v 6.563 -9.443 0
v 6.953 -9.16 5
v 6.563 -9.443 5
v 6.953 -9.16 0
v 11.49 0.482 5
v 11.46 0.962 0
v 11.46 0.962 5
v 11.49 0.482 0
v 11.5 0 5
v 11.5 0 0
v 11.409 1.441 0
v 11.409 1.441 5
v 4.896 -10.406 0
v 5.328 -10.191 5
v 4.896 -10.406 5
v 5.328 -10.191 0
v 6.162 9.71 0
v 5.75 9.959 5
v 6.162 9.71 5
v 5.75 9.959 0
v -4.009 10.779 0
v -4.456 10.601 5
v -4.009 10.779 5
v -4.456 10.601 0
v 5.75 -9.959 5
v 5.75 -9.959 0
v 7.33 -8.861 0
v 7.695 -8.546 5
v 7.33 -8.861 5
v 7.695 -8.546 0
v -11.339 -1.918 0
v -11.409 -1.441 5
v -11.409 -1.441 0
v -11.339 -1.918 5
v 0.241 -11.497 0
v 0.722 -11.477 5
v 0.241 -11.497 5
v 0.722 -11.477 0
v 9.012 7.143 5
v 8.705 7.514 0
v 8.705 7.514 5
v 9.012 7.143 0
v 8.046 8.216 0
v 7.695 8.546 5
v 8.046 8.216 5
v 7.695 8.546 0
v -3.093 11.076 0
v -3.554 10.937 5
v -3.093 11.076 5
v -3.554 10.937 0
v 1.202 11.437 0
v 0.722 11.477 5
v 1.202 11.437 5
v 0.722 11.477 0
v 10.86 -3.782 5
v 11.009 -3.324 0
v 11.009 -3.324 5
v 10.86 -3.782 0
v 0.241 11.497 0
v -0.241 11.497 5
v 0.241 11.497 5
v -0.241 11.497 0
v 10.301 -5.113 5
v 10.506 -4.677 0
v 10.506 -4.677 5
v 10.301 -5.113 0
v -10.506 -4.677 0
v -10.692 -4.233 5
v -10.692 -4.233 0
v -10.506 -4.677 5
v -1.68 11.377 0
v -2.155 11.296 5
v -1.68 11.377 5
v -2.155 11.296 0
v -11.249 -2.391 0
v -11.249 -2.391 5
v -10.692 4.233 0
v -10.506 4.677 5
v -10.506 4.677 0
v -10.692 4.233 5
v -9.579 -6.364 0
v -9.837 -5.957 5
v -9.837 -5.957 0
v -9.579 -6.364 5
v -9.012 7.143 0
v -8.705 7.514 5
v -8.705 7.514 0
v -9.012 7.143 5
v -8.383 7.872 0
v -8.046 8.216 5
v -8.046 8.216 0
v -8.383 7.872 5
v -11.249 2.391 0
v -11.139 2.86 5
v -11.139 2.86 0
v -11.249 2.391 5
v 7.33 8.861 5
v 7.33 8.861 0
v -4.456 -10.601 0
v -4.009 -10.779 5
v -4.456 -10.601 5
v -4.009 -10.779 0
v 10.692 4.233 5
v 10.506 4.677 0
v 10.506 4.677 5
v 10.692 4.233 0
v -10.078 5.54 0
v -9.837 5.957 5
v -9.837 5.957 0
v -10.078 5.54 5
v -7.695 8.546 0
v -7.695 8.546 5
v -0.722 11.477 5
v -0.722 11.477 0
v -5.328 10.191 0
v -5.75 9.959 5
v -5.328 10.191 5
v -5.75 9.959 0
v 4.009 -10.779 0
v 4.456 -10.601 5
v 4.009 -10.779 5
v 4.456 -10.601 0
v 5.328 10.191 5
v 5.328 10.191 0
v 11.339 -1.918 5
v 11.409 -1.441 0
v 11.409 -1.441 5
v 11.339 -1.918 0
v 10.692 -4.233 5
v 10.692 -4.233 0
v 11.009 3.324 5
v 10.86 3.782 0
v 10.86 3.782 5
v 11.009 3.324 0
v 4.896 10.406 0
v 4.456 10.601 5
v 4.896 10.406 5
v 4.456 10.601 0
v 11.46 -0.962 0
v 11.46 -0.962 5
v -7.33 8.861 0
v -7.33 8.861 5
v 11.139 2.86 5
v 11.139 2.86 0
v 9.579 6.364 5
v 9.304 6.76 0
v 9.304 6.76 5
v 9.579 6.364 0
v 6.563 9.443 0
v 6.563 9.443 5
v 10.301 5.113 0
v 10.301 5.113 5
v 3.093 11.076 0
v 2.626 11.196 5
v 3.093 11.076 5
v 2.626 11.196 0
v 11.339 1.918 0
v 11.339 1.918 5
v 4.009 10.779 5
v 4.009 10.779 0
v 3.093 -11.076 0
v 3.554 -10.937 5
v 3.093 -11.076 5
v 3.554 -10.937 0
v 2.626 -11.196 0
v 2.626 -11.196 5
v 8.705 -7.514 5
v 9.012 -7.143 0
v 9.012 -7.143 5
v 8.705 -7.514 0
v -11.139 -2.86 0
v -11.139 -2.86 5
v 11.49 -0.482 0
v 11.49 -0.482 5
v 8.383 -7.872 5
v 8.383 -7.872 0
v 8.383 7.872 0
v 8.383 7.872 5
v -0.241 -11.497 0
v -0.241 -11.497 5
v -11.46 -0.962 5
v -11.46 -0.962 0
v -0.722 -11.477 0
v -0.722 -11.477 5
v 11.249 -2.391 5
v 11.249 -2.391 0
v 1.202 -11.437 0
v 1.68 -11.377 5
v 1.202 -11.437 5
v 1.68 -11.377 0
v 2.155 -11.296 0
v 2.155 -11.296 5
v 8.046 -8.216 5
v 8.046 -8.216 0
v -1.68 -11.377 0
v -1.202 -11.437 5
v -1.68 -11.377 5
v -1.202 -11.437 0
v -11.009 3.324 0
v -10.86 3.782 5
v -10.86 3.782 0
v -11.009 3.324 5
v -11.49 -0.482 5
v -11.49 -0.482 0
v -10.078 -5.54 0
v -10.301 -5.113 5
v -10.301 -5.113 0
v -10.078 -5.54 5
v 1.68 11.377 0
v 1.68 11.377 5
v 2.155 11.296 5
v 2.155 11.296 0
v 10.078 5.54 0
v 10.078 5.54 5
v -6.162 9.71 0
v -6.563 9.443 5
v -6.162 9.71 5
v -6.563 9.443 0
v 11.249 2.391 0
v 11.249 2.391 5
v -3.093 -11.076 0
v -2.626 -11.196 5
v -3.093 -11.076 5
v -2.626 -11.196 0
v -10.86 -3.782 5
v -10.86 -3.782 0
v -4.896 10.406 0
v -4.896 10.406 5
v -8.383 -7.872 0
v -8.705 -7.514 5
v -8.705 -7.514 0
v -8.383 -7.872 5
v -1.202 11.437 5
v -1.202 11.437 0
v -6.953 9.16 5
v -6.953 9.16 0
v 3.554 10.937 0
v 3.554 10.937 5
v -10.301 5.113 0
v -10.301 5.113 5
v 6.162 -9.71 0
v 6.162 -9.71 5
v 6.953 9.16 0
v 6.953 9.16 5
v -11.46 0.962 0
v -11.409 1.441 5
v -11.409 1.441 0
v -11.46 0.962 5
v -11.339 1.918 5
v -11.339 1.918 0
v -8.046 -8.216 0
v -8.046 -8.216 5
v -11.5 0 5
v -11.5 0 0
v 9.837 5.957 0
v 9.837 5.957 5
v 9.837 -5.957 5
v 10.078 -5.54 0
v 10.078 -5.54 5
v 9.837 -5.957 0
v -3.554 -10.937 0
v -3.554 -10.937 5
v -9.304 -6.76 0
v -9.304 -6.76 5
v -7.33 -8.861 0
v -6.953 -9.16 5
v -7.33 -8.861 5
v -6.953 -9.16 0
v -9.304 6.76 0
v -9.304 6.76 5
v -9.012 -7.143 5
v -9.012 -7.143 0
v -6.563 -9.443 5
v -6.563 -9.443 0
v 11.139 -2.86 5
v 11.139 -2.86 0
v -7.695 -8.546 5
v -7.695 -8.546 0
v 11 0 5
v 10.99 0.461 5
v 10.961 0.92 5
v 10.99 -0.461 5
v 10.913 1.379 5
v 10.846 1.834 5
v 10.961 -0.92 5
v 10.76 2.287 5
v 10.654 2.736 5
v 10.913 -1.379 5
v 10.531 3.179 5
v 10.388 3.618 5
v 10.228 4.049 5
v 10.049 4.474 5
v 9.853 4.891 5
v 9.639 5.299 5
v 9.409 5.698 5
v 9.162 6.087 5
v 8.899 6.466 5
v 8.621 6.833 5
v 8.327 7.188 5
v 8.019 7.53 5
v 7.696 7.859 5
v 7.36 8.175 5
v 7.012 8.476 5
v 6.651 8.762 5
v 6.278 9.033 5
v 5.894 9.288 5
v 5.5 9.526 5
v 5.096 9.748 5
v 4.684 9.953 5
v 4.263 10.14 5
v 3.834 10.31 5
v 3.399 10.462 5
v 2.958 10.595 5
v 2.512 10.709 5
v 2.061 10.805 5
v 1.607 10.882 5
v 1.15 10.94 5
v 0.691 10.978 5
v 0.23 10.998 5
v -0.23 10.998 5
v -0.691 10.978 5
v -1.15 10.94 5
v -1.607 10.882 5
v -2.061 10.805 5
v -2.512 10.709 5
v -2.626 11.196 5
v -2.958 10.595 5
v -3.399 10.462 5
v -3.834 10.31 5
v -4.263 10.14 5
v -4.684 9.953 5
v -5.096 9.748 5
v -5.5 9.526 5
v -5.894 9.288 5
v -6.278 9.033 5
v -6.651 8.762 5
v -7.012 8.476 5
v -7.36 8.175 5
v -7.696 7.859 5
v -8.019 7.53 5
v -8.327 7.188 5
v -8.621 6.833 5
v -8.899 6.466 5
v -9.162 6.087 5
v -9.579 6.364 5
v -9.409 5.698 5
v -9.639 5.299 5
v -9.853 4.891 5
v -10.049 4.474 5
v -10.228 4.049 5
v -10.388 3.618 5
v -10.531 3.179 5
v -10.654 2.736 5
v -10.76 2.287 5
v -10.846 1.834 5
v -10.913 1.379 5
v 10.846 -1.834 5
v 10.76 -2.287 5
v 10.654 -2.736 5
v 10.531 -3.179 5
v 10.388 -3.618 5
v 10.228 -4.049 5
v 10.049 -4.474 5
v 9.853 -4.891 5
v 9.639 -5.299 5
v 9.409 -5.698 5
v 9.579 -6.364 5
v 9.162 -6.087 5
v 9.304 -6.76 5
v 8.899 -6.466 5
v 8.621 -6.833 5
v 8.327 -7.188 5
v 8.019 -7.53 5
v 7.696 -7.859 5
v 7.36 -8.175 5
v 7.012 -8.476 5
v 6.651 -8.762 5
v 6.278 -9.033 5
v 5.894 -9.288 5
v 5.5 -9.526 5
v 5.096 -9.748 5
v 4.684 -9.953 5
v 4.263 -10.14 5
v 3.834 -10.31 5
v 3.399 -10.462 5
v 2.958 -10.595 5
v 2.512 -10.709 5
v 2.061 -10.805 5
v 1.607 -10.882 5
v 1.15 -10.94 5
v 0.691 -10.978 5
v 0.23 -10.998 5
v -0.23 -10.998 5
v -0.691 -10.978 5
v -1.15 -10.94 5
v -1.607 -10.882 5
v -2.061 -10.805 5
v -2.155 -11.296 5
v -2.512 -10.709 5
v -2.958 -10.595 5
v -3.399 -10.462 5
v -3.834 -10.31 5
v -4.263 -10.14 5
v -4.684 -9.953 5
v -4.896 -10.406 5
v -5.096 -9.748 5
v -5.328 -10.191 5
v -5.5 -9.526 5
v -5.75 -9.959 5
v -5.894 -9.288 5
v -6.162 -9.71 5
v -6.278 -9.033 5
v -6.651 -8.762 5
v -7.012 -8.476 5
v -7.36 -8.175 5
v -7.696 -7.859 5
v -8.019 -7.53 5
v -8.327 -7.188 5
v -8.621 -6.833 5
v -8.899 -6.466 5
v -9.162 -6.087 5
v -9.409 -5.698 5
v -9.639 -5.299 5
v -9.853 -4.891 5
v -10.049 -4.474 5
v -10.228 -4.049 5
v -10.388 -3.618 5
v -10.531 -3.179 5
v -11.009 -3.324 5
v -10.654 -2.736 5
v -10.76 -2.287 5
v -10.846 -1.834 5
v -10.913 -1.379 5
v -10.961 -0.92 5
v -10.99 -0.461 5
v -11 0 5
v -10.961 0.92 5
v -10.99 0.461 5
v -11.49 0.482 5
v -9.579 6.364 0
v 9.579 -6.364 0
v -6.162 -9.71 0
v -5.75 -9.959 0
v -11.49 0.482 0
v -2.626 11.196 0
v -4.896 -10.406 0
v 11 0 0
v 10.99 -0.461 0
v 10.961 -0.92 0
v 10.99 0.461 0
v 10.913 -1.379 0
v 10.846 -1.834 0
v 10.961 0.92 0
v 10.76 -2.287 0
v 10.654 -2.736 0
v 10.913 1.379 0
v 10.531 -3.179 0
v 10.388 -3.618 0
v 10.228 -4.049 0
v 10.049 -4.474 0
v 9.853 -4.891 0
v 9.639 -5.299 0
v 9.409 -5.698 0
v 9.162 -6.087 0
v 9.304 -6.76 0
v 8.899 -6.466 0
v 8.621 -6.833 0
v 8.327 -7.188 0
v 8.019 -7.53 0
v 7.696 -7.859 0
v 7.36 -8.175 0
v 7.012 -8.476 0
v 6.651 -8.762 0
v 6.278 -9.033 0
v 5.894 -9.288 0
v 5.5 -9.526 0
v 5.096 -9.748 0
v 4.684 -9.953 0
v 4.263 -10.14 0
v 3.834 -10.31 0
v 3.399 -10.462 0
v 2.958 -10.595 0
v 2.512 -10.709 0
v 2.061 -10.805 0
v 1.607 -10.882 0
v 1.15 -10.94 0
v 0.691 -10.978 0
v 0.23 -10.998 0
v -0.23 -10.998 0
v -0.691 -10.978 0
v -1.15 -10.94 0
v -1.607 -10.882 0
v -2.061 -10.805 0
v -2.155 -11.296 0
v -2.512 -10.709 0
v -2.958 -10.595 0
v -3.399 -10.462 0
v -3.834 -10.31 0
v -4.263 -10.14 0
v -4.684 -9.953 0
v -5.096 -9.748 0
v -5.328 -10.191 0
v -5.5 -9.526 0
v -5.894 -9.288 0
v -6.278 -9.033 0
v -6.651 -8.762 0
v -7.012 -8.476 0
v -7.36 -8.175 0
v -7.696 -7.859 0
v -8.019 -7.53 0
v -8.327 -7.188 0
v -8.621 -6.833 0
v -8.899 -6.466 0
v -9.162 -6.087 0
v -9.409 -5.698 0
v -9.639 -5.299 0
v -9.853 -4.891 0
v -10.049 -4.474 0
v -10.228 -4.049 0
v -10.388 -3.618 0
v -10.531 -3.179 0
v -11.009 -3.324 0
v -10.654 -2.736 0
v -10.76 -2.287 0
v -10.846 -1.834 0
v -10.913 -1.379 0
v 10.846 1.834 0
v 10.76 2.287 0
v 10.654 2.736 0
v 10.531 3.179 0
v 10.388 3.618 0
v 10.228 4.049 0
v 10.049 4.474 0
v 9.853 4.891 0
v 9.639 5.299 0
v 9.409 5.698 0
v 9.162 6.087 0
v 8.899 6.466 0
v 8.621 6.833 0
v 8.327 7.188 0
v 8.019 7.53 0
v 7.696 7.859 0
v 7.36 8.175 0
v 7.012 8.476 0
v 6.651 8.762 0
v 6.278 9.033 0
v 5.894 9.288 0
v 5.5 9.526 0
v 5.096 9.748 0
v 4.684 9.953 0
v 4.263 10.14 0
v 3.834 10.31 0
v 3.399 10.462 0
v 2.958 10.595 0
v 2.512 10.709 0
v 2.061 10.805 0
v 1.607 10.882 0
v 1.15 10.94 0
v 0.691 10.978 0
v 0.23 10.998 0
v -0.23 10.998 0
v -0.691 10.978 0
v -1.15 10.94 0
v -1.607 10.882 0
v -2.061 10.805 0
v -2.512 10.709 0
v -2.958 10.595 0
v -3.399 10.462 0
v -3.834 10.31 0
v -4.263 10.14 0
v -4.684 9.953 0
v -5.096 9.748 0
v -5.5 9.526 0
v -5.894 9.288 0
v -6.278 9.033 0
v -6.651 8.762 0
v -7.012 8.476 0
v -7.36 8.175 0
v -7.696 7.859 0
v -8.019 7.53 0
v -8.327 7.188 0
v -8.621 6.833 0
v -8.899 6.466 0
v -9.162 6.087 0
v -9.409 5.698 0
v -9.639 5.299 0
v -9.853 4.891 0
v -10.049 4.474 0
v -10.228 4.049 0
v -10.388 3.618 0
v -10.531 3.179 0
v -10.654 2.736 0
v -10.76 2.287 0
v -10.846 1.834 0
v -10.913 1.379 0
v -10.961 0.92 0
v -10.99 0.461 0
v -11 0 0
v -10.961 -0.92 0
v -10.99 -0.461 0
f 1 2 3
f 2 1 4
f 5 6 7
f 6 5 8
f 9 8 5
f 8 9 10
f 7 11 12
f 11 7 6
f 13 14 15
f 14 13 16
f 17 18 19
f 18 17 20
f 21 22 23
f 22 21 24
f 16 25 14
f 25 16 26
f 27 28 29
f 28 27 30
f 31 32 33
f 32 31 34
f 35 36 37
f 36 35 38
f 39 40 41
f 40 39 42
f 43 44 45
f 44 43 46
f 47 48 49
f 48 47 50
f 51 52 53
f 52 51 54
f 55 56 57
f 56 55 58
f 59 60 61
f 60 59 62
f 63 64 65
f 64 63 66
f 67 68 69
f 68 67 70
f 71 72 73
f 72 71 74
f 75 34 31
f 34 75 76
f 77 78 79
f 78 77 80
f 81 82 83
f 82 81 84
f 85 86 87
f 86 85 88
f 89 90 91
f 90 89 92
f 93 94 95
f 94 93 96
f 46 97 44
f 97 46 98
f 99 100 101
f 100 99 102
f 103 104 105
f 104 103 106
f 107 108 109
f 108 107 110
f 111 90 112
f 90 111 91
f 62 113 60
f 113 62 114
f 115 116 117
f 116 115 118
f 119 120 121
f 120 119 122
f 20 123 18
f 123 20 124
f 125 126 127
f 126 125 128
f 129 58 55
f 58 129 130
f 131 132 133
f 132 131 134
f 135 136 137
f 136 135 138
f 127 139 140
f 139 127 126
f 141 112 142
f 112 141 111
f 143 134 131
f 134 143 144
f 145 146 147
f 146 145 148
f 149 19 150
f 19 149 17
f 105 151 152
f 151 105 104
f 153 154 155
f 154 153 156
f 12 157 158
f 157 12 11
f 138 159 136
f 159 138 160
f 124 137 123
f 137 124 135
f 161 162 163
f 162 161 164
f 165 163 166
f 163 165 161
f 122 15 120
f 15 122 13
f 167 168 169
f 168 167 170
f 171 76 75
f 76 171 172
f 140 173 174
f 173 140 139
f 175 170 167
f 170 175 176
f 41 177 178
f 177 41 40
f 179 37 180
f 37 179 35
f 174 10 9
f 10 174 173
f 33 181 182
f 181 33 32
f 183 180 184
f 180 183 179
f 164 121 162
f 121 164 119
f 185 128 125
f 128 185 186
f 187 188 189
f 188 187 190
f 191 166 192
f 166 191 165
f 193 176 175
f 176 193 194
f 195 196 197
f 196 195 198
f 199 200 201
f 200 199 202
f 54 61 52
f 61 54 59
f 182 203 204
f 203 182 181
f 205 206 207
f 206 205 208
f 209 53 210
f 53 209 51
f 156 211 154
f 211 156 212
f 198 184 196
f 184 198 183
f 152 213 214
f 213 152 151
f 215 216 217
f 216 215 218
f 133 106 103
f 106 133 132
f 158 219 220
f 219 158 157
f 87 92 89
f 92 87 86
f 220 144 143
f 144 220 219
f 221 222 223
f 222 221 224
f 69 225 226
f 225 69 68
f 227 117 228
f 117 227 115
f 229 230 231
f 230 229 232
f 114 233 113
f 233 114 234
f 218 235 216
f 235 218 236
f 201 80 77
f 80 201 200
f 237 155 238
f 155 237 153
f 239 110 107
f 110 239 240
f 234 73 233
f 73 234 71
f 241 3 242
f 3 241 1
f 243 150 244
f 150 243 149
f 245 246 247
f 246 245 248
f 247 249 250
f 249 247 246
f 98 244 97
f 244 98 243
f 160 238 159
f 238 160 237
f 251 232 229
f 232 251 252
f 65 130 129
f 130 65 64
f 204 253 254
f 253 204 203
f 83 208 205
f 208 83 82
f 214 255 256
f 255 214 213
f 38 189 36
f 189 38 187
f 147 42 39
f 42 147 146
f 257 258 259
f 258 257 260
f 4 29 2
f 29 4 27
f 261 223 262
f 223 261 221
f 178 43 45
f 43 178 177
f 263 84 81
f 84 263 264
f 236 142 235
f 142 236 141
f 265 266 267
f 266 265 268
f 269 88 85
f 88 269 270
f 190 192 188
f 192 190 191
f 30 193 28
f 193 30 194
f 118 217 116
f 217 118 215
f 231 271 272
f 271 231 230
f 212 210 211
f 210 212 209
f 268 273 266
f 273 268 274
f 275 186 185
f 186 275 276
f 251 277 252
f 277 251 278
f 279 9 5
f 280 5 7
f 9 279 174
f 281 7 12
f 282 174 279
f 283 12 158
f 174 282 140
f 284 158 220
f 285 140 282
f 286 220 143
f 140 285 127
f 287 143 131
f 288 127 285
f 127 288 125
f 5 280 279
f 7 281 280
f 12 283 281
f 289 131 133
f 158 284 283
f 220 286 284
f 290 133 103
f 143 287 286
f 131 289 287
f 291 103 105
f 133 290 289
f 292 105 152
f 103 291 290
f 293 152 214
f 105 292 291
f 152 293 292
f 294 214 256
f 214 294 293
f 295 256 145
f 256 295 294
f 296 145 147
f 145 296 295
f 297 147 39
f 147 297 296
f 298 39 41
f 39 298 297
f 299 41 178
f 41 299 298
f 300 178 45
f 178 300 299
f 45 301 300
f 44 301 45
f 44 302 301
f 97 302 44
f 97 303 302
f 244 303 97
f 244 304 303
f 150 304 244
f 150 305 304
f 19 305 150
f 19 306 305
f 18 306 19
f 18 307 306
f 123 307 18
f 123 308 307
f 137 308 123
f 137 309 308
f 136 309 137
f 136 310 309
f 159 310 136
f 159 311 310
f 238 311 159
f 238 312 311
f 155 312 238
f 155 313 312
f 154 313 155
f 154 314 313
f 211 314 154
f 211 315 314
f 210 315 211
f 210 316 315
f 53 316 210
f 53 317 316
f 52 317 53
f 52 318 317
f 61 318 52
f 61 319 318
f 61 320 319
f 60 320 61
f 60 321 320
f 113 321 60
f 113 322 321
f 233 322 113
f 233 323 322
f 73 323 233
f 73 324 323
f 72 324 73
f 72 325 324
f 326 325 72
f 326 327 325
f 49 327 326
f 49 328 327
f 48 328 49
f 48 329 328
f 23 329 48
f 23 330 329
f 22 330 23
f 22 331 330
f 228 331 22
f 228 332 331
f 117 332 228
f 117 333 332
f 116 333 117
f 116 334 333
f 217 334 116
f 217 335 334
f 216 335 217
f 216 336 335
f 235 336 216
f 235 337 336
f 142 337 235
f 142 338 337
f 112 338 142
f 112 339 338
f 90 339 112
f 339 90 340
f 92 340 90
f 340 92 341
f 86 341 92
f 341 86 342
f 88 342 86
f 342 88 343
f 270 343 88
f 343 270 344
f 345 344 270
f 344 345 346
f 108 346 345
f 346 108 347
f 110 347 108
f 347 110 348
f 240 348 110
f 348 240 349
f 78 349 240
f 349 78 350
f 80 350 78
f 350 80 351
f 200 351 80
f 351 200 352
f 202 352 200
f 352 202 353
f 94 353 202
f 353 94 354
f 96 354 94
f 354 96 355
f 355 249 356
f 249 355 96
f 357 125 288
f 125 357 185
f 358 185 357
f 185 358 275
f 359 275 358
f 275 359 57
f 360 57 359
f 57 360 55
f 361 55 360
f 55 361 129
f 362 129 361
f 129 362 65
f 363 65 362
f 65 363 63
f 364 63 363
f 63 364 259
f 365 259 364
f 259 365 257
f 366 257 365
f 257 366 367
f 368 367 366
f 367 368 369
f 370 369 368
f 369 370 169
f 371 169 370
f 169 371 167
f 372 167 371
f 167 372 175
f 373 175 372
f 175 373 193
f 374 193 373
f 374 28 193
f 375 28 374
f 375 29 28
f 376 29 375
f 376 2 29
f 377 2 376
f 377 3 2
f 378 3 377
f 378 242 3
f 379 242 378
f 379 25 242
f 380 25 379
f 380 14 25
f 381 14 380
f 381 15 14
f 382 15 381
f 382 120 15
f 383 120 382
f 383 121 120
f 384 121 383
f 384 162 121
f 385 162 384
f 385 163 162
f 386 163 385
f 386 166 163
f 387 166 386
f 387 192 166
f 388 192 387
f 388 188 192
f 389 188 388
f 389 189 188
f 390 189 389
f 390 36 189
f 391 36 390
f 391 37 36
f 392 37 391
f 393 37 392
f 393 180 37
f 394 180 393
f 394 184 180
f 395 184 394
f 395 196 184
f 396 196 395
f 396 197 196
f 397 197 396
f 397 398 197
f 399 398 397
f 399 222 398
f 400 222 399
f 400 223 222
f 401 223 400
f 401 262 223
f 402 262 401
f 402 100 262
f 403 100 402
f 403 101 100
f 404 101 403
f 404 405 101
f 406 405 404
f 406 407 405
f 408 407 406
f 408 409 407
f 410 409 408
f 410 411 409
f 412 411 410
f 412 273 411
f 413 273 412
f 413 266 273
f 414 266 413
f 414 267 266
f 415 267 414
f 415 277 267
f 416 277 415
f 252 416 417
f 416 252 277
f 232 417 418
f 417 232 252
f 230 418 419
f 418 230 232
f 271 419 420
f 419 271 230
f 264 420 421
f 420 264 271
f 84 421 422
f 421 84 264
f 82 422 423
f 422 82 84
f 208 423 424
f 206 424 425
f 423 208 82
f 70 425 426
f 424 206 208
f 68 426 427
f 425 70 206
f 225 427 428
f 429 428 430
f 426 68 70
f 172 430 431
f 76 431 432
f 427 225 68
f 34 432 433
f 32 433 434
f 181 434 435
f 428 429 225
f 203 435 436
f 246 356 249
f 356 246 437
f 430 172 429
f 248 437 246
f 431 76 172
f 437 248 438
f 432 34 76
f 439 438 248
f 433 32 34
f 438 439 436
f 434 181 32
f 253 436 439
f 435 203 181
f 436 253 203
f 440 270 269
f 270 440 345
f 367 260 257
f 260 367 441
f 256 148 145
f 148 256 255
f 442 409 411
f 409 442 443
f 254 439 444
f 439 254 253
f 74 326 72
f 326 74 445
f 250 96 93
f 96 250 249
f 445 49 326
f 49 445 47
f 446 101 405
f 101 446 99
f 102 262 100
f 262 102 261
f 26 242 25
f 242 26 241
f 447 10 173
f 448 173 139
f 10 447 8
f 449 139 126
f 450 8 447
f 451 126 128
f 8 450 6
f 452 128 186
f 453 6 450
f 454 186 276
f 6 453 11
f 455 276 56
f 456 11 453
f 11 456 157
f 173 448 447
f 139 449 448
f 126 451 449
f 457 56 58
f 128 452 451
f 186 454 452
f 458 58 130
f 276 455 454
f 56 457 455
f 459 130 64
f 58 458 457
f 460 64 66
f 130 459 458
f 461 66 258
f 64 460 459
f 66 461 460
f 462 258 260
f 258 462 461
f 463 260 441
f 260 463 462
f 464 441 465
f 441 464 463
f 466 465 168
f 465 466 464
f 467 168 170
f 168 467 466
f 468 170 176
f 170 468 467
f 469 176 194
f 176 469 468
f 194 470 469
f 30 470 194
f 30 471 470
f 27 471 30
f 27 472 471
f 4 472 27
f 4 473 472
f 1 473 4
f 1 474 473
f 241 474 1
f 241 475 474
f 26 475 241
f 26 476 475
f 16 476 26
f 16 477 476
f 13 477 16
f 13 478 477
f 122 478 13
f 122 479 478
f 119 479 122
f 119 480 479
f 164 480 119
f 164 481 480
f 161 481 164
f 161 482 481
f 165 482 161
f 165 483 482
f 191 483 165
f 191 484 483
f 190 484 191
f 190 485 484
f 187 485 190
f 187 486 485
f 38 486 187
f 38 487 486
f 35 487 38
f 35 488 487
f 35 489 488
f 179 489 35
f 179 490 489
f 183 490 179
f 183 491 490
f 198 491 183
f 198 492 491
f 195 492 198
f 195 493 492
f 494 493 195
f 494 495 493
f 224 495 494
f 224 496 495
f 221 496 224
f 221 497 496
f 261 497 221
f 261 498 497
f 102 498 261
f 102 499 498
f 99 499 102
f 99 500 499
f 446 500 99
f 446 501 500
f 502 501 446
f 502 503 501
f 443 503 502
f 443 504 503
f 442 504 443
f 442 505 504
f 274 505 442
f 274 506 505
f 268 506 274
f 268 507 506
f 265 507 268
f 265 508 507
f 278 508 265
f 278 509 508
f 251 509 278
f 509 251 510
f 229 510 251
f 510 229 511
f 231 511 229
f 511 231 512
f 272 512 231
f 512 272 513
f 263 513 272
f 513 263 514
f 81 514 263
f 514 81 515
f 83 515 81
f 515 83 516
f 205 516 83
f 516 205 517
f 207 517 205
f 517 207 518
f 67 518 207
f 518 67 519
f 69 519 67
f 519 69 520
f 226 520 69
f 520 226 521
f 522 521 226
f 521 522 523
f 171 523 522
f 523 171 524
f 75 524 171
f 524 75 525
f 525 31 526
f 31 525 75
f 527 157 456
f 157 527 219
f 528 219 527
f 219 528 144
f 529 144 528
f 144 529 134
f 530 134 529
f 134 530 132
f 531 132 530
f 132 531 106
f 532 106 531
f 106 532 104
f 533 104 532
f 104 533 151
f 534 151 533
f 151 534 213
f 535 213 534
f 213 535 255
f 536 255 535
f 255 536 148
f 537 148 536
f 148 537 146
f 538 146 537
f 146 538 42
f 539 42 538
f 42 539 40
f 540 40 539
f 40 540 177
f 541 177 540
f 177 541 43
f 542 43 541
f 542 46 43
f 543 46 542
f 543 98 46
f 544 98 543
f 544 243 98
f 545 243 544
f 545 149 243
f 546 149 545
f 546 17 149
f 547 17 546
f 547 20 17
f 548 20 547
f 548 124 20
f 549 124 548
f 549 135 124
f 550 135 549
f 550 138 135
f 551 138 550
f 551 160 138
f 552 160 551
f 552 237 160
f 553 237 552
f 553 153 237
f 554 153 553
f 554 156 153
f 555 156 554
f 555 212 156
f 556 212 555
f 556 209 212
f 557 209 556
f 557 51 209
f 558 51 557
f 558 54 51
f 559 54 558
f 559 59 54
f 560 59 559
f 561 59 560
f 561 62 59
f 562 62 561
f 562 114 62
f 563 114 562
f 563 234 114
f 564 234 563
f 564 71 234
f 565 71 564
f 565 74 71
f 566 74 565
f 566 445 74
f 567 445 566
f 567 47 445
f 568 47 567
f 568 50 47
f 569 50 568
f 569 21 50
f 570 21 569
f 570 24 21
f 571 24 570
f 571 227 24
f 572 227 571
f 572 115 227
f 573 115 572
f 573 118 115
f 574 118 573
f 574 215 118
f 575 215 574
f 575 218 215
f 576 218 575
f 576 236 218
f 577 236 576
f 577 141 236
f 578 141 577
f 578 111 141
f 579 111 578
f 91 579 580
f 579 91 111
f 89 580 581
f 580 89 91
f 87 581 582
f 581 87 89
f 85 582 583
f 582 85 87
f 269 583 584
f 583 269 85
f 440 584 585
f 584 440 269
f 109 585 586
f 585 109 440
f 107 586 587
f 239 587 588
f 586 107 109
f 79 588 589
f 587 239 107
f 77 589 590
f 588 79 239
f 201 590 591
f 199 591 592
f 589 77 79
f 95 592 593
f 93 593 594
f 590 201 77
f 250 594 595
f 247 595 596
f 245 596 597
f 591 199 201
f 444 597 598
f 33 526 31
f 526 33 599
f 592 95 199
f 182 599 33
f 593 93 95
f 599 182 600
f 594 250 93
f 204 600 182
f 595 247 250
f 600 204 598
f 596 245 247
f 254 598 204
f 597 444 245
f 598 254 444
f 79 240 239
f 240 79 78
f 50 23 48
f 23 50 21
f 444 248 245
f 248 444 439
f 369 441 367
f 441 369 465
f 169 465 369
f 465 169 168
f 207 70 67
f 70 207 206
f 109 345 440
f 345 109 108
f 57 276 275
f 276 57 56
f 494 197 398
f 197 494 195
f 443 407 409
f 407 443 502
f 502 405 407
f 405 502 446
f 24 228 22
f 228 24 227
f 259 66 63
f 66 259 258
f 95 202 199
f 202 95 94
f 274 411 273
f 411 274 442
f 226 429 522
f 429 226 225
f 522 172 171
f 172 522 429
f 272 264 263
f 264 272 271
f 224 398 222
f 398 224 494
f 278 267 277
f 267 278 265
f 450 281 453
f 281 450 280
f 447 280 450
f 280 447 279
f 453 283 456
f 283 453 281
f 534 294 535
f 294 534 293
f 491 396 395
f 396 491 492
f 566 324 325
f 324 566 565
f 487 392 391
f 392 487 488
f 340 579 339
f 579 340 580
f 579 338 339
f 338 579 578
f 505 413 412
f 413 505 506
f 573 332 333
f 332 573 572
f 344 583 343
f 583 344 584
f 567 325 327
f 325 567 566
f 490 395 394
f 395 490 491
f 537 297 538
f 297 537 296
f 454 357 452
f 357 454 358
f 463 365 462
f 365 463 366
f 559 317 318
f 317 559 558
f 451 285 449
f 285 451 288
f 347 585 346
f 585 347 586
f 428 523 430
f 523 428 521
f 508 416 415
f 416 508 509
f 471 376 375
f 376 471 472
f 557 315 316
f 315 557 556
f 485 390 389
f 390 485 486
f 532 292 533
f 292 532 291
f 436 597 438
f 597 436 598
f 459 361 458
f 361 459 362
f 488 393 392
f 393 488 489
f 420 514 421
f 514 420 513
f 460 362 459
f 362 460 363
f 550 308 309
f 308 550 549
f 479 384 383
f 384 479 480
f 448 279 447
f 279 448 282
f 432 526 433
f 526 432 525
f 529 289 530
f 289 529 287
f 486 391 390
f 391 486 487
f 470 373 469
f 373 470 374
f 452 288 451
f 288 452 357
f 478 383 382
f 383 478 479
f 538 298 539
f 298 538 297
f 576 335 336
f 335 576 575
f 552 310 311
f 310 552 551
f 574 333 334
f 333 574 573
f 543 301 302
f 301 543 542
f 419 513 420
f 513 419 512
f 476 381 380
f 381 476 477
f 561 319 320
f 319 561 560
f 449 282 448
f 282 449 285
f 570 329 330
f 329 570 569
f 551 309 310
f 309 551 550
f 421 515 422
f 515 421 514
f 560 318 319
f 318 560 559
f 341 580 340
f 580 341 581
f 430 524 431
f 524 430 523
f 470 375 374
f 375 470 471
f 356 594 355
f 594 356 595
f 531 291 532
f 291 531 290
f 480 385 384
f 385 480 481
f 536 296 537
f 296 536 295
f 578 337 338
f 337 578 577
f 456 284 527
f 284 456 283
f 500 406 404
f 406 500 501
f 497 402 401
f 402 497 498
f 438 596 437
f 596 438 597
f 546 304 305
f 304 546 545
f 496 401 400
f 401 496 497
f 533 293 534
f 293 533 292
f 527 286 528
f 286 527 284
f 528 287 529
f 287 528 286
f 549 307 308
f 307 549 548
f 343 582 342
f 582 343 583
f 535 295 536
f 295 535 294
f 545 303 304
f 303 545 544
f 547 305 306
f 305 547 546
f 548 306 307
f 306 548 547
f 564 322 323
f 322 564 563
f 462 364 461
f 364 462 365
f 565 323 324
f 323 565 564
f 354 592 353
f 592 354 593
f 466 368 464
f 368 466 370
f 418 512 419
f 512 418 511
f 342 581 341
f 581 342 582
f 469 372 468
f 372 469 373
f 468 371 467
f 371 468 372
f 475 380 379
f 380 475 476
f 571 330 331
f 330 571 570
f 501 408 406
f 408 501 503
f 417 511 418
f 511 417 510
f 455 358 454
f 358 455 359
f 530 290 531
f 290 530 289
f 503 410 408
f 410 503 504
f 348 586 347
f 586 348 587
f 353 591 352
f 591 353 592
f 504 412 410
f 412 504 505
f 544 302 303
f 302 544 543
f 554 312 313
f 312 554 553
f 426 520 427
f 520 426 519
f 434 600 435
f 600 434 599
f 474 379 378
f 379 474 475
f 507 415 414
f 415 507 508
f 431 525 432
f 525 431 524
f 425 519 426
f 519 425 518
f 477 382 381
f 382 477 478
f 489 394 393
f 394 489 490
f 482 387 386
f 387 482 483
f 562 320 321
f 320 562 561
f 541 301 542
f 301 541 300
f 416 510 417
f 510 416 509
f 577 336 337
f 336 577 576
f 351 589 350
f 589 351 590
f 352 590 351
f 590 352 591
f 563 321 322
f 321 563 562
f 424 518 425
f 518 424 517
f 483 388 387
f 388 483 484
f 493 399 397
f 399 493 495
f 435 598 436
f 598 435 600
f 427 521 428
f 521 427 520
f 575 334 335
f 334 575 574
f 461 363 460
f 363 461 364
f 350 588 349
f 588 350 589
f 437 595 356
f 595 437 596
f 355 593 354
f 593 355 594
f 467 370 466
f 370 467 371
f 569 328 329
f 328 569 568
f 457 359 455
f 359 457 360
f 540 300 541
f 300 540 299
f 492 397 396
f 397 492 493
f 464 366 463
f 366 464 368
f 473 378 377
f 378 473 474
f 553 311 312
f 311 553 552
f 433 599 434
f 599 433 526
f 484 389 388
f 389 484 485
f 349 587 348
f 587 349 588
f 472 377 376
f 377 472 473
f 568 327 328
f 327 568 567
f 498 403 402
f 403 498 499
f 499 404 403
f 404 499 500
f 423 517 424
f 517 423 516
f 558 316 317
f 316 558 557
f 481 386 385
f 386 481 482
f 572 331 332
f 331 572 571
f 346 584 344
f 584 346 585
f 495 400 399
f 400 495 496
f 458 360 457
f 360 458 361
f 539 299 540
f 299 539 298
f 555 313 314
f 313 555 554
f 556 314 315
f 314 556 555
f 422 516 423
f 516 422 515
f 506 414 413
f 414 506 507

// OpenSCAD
$fn = 150;

difference() {
	cylinder(d = 23.0, h = 5.0);
	#translate(v = [0, 0, -1]) {
		cylinder(d = 22.0, h = 7.0);
	}
}
